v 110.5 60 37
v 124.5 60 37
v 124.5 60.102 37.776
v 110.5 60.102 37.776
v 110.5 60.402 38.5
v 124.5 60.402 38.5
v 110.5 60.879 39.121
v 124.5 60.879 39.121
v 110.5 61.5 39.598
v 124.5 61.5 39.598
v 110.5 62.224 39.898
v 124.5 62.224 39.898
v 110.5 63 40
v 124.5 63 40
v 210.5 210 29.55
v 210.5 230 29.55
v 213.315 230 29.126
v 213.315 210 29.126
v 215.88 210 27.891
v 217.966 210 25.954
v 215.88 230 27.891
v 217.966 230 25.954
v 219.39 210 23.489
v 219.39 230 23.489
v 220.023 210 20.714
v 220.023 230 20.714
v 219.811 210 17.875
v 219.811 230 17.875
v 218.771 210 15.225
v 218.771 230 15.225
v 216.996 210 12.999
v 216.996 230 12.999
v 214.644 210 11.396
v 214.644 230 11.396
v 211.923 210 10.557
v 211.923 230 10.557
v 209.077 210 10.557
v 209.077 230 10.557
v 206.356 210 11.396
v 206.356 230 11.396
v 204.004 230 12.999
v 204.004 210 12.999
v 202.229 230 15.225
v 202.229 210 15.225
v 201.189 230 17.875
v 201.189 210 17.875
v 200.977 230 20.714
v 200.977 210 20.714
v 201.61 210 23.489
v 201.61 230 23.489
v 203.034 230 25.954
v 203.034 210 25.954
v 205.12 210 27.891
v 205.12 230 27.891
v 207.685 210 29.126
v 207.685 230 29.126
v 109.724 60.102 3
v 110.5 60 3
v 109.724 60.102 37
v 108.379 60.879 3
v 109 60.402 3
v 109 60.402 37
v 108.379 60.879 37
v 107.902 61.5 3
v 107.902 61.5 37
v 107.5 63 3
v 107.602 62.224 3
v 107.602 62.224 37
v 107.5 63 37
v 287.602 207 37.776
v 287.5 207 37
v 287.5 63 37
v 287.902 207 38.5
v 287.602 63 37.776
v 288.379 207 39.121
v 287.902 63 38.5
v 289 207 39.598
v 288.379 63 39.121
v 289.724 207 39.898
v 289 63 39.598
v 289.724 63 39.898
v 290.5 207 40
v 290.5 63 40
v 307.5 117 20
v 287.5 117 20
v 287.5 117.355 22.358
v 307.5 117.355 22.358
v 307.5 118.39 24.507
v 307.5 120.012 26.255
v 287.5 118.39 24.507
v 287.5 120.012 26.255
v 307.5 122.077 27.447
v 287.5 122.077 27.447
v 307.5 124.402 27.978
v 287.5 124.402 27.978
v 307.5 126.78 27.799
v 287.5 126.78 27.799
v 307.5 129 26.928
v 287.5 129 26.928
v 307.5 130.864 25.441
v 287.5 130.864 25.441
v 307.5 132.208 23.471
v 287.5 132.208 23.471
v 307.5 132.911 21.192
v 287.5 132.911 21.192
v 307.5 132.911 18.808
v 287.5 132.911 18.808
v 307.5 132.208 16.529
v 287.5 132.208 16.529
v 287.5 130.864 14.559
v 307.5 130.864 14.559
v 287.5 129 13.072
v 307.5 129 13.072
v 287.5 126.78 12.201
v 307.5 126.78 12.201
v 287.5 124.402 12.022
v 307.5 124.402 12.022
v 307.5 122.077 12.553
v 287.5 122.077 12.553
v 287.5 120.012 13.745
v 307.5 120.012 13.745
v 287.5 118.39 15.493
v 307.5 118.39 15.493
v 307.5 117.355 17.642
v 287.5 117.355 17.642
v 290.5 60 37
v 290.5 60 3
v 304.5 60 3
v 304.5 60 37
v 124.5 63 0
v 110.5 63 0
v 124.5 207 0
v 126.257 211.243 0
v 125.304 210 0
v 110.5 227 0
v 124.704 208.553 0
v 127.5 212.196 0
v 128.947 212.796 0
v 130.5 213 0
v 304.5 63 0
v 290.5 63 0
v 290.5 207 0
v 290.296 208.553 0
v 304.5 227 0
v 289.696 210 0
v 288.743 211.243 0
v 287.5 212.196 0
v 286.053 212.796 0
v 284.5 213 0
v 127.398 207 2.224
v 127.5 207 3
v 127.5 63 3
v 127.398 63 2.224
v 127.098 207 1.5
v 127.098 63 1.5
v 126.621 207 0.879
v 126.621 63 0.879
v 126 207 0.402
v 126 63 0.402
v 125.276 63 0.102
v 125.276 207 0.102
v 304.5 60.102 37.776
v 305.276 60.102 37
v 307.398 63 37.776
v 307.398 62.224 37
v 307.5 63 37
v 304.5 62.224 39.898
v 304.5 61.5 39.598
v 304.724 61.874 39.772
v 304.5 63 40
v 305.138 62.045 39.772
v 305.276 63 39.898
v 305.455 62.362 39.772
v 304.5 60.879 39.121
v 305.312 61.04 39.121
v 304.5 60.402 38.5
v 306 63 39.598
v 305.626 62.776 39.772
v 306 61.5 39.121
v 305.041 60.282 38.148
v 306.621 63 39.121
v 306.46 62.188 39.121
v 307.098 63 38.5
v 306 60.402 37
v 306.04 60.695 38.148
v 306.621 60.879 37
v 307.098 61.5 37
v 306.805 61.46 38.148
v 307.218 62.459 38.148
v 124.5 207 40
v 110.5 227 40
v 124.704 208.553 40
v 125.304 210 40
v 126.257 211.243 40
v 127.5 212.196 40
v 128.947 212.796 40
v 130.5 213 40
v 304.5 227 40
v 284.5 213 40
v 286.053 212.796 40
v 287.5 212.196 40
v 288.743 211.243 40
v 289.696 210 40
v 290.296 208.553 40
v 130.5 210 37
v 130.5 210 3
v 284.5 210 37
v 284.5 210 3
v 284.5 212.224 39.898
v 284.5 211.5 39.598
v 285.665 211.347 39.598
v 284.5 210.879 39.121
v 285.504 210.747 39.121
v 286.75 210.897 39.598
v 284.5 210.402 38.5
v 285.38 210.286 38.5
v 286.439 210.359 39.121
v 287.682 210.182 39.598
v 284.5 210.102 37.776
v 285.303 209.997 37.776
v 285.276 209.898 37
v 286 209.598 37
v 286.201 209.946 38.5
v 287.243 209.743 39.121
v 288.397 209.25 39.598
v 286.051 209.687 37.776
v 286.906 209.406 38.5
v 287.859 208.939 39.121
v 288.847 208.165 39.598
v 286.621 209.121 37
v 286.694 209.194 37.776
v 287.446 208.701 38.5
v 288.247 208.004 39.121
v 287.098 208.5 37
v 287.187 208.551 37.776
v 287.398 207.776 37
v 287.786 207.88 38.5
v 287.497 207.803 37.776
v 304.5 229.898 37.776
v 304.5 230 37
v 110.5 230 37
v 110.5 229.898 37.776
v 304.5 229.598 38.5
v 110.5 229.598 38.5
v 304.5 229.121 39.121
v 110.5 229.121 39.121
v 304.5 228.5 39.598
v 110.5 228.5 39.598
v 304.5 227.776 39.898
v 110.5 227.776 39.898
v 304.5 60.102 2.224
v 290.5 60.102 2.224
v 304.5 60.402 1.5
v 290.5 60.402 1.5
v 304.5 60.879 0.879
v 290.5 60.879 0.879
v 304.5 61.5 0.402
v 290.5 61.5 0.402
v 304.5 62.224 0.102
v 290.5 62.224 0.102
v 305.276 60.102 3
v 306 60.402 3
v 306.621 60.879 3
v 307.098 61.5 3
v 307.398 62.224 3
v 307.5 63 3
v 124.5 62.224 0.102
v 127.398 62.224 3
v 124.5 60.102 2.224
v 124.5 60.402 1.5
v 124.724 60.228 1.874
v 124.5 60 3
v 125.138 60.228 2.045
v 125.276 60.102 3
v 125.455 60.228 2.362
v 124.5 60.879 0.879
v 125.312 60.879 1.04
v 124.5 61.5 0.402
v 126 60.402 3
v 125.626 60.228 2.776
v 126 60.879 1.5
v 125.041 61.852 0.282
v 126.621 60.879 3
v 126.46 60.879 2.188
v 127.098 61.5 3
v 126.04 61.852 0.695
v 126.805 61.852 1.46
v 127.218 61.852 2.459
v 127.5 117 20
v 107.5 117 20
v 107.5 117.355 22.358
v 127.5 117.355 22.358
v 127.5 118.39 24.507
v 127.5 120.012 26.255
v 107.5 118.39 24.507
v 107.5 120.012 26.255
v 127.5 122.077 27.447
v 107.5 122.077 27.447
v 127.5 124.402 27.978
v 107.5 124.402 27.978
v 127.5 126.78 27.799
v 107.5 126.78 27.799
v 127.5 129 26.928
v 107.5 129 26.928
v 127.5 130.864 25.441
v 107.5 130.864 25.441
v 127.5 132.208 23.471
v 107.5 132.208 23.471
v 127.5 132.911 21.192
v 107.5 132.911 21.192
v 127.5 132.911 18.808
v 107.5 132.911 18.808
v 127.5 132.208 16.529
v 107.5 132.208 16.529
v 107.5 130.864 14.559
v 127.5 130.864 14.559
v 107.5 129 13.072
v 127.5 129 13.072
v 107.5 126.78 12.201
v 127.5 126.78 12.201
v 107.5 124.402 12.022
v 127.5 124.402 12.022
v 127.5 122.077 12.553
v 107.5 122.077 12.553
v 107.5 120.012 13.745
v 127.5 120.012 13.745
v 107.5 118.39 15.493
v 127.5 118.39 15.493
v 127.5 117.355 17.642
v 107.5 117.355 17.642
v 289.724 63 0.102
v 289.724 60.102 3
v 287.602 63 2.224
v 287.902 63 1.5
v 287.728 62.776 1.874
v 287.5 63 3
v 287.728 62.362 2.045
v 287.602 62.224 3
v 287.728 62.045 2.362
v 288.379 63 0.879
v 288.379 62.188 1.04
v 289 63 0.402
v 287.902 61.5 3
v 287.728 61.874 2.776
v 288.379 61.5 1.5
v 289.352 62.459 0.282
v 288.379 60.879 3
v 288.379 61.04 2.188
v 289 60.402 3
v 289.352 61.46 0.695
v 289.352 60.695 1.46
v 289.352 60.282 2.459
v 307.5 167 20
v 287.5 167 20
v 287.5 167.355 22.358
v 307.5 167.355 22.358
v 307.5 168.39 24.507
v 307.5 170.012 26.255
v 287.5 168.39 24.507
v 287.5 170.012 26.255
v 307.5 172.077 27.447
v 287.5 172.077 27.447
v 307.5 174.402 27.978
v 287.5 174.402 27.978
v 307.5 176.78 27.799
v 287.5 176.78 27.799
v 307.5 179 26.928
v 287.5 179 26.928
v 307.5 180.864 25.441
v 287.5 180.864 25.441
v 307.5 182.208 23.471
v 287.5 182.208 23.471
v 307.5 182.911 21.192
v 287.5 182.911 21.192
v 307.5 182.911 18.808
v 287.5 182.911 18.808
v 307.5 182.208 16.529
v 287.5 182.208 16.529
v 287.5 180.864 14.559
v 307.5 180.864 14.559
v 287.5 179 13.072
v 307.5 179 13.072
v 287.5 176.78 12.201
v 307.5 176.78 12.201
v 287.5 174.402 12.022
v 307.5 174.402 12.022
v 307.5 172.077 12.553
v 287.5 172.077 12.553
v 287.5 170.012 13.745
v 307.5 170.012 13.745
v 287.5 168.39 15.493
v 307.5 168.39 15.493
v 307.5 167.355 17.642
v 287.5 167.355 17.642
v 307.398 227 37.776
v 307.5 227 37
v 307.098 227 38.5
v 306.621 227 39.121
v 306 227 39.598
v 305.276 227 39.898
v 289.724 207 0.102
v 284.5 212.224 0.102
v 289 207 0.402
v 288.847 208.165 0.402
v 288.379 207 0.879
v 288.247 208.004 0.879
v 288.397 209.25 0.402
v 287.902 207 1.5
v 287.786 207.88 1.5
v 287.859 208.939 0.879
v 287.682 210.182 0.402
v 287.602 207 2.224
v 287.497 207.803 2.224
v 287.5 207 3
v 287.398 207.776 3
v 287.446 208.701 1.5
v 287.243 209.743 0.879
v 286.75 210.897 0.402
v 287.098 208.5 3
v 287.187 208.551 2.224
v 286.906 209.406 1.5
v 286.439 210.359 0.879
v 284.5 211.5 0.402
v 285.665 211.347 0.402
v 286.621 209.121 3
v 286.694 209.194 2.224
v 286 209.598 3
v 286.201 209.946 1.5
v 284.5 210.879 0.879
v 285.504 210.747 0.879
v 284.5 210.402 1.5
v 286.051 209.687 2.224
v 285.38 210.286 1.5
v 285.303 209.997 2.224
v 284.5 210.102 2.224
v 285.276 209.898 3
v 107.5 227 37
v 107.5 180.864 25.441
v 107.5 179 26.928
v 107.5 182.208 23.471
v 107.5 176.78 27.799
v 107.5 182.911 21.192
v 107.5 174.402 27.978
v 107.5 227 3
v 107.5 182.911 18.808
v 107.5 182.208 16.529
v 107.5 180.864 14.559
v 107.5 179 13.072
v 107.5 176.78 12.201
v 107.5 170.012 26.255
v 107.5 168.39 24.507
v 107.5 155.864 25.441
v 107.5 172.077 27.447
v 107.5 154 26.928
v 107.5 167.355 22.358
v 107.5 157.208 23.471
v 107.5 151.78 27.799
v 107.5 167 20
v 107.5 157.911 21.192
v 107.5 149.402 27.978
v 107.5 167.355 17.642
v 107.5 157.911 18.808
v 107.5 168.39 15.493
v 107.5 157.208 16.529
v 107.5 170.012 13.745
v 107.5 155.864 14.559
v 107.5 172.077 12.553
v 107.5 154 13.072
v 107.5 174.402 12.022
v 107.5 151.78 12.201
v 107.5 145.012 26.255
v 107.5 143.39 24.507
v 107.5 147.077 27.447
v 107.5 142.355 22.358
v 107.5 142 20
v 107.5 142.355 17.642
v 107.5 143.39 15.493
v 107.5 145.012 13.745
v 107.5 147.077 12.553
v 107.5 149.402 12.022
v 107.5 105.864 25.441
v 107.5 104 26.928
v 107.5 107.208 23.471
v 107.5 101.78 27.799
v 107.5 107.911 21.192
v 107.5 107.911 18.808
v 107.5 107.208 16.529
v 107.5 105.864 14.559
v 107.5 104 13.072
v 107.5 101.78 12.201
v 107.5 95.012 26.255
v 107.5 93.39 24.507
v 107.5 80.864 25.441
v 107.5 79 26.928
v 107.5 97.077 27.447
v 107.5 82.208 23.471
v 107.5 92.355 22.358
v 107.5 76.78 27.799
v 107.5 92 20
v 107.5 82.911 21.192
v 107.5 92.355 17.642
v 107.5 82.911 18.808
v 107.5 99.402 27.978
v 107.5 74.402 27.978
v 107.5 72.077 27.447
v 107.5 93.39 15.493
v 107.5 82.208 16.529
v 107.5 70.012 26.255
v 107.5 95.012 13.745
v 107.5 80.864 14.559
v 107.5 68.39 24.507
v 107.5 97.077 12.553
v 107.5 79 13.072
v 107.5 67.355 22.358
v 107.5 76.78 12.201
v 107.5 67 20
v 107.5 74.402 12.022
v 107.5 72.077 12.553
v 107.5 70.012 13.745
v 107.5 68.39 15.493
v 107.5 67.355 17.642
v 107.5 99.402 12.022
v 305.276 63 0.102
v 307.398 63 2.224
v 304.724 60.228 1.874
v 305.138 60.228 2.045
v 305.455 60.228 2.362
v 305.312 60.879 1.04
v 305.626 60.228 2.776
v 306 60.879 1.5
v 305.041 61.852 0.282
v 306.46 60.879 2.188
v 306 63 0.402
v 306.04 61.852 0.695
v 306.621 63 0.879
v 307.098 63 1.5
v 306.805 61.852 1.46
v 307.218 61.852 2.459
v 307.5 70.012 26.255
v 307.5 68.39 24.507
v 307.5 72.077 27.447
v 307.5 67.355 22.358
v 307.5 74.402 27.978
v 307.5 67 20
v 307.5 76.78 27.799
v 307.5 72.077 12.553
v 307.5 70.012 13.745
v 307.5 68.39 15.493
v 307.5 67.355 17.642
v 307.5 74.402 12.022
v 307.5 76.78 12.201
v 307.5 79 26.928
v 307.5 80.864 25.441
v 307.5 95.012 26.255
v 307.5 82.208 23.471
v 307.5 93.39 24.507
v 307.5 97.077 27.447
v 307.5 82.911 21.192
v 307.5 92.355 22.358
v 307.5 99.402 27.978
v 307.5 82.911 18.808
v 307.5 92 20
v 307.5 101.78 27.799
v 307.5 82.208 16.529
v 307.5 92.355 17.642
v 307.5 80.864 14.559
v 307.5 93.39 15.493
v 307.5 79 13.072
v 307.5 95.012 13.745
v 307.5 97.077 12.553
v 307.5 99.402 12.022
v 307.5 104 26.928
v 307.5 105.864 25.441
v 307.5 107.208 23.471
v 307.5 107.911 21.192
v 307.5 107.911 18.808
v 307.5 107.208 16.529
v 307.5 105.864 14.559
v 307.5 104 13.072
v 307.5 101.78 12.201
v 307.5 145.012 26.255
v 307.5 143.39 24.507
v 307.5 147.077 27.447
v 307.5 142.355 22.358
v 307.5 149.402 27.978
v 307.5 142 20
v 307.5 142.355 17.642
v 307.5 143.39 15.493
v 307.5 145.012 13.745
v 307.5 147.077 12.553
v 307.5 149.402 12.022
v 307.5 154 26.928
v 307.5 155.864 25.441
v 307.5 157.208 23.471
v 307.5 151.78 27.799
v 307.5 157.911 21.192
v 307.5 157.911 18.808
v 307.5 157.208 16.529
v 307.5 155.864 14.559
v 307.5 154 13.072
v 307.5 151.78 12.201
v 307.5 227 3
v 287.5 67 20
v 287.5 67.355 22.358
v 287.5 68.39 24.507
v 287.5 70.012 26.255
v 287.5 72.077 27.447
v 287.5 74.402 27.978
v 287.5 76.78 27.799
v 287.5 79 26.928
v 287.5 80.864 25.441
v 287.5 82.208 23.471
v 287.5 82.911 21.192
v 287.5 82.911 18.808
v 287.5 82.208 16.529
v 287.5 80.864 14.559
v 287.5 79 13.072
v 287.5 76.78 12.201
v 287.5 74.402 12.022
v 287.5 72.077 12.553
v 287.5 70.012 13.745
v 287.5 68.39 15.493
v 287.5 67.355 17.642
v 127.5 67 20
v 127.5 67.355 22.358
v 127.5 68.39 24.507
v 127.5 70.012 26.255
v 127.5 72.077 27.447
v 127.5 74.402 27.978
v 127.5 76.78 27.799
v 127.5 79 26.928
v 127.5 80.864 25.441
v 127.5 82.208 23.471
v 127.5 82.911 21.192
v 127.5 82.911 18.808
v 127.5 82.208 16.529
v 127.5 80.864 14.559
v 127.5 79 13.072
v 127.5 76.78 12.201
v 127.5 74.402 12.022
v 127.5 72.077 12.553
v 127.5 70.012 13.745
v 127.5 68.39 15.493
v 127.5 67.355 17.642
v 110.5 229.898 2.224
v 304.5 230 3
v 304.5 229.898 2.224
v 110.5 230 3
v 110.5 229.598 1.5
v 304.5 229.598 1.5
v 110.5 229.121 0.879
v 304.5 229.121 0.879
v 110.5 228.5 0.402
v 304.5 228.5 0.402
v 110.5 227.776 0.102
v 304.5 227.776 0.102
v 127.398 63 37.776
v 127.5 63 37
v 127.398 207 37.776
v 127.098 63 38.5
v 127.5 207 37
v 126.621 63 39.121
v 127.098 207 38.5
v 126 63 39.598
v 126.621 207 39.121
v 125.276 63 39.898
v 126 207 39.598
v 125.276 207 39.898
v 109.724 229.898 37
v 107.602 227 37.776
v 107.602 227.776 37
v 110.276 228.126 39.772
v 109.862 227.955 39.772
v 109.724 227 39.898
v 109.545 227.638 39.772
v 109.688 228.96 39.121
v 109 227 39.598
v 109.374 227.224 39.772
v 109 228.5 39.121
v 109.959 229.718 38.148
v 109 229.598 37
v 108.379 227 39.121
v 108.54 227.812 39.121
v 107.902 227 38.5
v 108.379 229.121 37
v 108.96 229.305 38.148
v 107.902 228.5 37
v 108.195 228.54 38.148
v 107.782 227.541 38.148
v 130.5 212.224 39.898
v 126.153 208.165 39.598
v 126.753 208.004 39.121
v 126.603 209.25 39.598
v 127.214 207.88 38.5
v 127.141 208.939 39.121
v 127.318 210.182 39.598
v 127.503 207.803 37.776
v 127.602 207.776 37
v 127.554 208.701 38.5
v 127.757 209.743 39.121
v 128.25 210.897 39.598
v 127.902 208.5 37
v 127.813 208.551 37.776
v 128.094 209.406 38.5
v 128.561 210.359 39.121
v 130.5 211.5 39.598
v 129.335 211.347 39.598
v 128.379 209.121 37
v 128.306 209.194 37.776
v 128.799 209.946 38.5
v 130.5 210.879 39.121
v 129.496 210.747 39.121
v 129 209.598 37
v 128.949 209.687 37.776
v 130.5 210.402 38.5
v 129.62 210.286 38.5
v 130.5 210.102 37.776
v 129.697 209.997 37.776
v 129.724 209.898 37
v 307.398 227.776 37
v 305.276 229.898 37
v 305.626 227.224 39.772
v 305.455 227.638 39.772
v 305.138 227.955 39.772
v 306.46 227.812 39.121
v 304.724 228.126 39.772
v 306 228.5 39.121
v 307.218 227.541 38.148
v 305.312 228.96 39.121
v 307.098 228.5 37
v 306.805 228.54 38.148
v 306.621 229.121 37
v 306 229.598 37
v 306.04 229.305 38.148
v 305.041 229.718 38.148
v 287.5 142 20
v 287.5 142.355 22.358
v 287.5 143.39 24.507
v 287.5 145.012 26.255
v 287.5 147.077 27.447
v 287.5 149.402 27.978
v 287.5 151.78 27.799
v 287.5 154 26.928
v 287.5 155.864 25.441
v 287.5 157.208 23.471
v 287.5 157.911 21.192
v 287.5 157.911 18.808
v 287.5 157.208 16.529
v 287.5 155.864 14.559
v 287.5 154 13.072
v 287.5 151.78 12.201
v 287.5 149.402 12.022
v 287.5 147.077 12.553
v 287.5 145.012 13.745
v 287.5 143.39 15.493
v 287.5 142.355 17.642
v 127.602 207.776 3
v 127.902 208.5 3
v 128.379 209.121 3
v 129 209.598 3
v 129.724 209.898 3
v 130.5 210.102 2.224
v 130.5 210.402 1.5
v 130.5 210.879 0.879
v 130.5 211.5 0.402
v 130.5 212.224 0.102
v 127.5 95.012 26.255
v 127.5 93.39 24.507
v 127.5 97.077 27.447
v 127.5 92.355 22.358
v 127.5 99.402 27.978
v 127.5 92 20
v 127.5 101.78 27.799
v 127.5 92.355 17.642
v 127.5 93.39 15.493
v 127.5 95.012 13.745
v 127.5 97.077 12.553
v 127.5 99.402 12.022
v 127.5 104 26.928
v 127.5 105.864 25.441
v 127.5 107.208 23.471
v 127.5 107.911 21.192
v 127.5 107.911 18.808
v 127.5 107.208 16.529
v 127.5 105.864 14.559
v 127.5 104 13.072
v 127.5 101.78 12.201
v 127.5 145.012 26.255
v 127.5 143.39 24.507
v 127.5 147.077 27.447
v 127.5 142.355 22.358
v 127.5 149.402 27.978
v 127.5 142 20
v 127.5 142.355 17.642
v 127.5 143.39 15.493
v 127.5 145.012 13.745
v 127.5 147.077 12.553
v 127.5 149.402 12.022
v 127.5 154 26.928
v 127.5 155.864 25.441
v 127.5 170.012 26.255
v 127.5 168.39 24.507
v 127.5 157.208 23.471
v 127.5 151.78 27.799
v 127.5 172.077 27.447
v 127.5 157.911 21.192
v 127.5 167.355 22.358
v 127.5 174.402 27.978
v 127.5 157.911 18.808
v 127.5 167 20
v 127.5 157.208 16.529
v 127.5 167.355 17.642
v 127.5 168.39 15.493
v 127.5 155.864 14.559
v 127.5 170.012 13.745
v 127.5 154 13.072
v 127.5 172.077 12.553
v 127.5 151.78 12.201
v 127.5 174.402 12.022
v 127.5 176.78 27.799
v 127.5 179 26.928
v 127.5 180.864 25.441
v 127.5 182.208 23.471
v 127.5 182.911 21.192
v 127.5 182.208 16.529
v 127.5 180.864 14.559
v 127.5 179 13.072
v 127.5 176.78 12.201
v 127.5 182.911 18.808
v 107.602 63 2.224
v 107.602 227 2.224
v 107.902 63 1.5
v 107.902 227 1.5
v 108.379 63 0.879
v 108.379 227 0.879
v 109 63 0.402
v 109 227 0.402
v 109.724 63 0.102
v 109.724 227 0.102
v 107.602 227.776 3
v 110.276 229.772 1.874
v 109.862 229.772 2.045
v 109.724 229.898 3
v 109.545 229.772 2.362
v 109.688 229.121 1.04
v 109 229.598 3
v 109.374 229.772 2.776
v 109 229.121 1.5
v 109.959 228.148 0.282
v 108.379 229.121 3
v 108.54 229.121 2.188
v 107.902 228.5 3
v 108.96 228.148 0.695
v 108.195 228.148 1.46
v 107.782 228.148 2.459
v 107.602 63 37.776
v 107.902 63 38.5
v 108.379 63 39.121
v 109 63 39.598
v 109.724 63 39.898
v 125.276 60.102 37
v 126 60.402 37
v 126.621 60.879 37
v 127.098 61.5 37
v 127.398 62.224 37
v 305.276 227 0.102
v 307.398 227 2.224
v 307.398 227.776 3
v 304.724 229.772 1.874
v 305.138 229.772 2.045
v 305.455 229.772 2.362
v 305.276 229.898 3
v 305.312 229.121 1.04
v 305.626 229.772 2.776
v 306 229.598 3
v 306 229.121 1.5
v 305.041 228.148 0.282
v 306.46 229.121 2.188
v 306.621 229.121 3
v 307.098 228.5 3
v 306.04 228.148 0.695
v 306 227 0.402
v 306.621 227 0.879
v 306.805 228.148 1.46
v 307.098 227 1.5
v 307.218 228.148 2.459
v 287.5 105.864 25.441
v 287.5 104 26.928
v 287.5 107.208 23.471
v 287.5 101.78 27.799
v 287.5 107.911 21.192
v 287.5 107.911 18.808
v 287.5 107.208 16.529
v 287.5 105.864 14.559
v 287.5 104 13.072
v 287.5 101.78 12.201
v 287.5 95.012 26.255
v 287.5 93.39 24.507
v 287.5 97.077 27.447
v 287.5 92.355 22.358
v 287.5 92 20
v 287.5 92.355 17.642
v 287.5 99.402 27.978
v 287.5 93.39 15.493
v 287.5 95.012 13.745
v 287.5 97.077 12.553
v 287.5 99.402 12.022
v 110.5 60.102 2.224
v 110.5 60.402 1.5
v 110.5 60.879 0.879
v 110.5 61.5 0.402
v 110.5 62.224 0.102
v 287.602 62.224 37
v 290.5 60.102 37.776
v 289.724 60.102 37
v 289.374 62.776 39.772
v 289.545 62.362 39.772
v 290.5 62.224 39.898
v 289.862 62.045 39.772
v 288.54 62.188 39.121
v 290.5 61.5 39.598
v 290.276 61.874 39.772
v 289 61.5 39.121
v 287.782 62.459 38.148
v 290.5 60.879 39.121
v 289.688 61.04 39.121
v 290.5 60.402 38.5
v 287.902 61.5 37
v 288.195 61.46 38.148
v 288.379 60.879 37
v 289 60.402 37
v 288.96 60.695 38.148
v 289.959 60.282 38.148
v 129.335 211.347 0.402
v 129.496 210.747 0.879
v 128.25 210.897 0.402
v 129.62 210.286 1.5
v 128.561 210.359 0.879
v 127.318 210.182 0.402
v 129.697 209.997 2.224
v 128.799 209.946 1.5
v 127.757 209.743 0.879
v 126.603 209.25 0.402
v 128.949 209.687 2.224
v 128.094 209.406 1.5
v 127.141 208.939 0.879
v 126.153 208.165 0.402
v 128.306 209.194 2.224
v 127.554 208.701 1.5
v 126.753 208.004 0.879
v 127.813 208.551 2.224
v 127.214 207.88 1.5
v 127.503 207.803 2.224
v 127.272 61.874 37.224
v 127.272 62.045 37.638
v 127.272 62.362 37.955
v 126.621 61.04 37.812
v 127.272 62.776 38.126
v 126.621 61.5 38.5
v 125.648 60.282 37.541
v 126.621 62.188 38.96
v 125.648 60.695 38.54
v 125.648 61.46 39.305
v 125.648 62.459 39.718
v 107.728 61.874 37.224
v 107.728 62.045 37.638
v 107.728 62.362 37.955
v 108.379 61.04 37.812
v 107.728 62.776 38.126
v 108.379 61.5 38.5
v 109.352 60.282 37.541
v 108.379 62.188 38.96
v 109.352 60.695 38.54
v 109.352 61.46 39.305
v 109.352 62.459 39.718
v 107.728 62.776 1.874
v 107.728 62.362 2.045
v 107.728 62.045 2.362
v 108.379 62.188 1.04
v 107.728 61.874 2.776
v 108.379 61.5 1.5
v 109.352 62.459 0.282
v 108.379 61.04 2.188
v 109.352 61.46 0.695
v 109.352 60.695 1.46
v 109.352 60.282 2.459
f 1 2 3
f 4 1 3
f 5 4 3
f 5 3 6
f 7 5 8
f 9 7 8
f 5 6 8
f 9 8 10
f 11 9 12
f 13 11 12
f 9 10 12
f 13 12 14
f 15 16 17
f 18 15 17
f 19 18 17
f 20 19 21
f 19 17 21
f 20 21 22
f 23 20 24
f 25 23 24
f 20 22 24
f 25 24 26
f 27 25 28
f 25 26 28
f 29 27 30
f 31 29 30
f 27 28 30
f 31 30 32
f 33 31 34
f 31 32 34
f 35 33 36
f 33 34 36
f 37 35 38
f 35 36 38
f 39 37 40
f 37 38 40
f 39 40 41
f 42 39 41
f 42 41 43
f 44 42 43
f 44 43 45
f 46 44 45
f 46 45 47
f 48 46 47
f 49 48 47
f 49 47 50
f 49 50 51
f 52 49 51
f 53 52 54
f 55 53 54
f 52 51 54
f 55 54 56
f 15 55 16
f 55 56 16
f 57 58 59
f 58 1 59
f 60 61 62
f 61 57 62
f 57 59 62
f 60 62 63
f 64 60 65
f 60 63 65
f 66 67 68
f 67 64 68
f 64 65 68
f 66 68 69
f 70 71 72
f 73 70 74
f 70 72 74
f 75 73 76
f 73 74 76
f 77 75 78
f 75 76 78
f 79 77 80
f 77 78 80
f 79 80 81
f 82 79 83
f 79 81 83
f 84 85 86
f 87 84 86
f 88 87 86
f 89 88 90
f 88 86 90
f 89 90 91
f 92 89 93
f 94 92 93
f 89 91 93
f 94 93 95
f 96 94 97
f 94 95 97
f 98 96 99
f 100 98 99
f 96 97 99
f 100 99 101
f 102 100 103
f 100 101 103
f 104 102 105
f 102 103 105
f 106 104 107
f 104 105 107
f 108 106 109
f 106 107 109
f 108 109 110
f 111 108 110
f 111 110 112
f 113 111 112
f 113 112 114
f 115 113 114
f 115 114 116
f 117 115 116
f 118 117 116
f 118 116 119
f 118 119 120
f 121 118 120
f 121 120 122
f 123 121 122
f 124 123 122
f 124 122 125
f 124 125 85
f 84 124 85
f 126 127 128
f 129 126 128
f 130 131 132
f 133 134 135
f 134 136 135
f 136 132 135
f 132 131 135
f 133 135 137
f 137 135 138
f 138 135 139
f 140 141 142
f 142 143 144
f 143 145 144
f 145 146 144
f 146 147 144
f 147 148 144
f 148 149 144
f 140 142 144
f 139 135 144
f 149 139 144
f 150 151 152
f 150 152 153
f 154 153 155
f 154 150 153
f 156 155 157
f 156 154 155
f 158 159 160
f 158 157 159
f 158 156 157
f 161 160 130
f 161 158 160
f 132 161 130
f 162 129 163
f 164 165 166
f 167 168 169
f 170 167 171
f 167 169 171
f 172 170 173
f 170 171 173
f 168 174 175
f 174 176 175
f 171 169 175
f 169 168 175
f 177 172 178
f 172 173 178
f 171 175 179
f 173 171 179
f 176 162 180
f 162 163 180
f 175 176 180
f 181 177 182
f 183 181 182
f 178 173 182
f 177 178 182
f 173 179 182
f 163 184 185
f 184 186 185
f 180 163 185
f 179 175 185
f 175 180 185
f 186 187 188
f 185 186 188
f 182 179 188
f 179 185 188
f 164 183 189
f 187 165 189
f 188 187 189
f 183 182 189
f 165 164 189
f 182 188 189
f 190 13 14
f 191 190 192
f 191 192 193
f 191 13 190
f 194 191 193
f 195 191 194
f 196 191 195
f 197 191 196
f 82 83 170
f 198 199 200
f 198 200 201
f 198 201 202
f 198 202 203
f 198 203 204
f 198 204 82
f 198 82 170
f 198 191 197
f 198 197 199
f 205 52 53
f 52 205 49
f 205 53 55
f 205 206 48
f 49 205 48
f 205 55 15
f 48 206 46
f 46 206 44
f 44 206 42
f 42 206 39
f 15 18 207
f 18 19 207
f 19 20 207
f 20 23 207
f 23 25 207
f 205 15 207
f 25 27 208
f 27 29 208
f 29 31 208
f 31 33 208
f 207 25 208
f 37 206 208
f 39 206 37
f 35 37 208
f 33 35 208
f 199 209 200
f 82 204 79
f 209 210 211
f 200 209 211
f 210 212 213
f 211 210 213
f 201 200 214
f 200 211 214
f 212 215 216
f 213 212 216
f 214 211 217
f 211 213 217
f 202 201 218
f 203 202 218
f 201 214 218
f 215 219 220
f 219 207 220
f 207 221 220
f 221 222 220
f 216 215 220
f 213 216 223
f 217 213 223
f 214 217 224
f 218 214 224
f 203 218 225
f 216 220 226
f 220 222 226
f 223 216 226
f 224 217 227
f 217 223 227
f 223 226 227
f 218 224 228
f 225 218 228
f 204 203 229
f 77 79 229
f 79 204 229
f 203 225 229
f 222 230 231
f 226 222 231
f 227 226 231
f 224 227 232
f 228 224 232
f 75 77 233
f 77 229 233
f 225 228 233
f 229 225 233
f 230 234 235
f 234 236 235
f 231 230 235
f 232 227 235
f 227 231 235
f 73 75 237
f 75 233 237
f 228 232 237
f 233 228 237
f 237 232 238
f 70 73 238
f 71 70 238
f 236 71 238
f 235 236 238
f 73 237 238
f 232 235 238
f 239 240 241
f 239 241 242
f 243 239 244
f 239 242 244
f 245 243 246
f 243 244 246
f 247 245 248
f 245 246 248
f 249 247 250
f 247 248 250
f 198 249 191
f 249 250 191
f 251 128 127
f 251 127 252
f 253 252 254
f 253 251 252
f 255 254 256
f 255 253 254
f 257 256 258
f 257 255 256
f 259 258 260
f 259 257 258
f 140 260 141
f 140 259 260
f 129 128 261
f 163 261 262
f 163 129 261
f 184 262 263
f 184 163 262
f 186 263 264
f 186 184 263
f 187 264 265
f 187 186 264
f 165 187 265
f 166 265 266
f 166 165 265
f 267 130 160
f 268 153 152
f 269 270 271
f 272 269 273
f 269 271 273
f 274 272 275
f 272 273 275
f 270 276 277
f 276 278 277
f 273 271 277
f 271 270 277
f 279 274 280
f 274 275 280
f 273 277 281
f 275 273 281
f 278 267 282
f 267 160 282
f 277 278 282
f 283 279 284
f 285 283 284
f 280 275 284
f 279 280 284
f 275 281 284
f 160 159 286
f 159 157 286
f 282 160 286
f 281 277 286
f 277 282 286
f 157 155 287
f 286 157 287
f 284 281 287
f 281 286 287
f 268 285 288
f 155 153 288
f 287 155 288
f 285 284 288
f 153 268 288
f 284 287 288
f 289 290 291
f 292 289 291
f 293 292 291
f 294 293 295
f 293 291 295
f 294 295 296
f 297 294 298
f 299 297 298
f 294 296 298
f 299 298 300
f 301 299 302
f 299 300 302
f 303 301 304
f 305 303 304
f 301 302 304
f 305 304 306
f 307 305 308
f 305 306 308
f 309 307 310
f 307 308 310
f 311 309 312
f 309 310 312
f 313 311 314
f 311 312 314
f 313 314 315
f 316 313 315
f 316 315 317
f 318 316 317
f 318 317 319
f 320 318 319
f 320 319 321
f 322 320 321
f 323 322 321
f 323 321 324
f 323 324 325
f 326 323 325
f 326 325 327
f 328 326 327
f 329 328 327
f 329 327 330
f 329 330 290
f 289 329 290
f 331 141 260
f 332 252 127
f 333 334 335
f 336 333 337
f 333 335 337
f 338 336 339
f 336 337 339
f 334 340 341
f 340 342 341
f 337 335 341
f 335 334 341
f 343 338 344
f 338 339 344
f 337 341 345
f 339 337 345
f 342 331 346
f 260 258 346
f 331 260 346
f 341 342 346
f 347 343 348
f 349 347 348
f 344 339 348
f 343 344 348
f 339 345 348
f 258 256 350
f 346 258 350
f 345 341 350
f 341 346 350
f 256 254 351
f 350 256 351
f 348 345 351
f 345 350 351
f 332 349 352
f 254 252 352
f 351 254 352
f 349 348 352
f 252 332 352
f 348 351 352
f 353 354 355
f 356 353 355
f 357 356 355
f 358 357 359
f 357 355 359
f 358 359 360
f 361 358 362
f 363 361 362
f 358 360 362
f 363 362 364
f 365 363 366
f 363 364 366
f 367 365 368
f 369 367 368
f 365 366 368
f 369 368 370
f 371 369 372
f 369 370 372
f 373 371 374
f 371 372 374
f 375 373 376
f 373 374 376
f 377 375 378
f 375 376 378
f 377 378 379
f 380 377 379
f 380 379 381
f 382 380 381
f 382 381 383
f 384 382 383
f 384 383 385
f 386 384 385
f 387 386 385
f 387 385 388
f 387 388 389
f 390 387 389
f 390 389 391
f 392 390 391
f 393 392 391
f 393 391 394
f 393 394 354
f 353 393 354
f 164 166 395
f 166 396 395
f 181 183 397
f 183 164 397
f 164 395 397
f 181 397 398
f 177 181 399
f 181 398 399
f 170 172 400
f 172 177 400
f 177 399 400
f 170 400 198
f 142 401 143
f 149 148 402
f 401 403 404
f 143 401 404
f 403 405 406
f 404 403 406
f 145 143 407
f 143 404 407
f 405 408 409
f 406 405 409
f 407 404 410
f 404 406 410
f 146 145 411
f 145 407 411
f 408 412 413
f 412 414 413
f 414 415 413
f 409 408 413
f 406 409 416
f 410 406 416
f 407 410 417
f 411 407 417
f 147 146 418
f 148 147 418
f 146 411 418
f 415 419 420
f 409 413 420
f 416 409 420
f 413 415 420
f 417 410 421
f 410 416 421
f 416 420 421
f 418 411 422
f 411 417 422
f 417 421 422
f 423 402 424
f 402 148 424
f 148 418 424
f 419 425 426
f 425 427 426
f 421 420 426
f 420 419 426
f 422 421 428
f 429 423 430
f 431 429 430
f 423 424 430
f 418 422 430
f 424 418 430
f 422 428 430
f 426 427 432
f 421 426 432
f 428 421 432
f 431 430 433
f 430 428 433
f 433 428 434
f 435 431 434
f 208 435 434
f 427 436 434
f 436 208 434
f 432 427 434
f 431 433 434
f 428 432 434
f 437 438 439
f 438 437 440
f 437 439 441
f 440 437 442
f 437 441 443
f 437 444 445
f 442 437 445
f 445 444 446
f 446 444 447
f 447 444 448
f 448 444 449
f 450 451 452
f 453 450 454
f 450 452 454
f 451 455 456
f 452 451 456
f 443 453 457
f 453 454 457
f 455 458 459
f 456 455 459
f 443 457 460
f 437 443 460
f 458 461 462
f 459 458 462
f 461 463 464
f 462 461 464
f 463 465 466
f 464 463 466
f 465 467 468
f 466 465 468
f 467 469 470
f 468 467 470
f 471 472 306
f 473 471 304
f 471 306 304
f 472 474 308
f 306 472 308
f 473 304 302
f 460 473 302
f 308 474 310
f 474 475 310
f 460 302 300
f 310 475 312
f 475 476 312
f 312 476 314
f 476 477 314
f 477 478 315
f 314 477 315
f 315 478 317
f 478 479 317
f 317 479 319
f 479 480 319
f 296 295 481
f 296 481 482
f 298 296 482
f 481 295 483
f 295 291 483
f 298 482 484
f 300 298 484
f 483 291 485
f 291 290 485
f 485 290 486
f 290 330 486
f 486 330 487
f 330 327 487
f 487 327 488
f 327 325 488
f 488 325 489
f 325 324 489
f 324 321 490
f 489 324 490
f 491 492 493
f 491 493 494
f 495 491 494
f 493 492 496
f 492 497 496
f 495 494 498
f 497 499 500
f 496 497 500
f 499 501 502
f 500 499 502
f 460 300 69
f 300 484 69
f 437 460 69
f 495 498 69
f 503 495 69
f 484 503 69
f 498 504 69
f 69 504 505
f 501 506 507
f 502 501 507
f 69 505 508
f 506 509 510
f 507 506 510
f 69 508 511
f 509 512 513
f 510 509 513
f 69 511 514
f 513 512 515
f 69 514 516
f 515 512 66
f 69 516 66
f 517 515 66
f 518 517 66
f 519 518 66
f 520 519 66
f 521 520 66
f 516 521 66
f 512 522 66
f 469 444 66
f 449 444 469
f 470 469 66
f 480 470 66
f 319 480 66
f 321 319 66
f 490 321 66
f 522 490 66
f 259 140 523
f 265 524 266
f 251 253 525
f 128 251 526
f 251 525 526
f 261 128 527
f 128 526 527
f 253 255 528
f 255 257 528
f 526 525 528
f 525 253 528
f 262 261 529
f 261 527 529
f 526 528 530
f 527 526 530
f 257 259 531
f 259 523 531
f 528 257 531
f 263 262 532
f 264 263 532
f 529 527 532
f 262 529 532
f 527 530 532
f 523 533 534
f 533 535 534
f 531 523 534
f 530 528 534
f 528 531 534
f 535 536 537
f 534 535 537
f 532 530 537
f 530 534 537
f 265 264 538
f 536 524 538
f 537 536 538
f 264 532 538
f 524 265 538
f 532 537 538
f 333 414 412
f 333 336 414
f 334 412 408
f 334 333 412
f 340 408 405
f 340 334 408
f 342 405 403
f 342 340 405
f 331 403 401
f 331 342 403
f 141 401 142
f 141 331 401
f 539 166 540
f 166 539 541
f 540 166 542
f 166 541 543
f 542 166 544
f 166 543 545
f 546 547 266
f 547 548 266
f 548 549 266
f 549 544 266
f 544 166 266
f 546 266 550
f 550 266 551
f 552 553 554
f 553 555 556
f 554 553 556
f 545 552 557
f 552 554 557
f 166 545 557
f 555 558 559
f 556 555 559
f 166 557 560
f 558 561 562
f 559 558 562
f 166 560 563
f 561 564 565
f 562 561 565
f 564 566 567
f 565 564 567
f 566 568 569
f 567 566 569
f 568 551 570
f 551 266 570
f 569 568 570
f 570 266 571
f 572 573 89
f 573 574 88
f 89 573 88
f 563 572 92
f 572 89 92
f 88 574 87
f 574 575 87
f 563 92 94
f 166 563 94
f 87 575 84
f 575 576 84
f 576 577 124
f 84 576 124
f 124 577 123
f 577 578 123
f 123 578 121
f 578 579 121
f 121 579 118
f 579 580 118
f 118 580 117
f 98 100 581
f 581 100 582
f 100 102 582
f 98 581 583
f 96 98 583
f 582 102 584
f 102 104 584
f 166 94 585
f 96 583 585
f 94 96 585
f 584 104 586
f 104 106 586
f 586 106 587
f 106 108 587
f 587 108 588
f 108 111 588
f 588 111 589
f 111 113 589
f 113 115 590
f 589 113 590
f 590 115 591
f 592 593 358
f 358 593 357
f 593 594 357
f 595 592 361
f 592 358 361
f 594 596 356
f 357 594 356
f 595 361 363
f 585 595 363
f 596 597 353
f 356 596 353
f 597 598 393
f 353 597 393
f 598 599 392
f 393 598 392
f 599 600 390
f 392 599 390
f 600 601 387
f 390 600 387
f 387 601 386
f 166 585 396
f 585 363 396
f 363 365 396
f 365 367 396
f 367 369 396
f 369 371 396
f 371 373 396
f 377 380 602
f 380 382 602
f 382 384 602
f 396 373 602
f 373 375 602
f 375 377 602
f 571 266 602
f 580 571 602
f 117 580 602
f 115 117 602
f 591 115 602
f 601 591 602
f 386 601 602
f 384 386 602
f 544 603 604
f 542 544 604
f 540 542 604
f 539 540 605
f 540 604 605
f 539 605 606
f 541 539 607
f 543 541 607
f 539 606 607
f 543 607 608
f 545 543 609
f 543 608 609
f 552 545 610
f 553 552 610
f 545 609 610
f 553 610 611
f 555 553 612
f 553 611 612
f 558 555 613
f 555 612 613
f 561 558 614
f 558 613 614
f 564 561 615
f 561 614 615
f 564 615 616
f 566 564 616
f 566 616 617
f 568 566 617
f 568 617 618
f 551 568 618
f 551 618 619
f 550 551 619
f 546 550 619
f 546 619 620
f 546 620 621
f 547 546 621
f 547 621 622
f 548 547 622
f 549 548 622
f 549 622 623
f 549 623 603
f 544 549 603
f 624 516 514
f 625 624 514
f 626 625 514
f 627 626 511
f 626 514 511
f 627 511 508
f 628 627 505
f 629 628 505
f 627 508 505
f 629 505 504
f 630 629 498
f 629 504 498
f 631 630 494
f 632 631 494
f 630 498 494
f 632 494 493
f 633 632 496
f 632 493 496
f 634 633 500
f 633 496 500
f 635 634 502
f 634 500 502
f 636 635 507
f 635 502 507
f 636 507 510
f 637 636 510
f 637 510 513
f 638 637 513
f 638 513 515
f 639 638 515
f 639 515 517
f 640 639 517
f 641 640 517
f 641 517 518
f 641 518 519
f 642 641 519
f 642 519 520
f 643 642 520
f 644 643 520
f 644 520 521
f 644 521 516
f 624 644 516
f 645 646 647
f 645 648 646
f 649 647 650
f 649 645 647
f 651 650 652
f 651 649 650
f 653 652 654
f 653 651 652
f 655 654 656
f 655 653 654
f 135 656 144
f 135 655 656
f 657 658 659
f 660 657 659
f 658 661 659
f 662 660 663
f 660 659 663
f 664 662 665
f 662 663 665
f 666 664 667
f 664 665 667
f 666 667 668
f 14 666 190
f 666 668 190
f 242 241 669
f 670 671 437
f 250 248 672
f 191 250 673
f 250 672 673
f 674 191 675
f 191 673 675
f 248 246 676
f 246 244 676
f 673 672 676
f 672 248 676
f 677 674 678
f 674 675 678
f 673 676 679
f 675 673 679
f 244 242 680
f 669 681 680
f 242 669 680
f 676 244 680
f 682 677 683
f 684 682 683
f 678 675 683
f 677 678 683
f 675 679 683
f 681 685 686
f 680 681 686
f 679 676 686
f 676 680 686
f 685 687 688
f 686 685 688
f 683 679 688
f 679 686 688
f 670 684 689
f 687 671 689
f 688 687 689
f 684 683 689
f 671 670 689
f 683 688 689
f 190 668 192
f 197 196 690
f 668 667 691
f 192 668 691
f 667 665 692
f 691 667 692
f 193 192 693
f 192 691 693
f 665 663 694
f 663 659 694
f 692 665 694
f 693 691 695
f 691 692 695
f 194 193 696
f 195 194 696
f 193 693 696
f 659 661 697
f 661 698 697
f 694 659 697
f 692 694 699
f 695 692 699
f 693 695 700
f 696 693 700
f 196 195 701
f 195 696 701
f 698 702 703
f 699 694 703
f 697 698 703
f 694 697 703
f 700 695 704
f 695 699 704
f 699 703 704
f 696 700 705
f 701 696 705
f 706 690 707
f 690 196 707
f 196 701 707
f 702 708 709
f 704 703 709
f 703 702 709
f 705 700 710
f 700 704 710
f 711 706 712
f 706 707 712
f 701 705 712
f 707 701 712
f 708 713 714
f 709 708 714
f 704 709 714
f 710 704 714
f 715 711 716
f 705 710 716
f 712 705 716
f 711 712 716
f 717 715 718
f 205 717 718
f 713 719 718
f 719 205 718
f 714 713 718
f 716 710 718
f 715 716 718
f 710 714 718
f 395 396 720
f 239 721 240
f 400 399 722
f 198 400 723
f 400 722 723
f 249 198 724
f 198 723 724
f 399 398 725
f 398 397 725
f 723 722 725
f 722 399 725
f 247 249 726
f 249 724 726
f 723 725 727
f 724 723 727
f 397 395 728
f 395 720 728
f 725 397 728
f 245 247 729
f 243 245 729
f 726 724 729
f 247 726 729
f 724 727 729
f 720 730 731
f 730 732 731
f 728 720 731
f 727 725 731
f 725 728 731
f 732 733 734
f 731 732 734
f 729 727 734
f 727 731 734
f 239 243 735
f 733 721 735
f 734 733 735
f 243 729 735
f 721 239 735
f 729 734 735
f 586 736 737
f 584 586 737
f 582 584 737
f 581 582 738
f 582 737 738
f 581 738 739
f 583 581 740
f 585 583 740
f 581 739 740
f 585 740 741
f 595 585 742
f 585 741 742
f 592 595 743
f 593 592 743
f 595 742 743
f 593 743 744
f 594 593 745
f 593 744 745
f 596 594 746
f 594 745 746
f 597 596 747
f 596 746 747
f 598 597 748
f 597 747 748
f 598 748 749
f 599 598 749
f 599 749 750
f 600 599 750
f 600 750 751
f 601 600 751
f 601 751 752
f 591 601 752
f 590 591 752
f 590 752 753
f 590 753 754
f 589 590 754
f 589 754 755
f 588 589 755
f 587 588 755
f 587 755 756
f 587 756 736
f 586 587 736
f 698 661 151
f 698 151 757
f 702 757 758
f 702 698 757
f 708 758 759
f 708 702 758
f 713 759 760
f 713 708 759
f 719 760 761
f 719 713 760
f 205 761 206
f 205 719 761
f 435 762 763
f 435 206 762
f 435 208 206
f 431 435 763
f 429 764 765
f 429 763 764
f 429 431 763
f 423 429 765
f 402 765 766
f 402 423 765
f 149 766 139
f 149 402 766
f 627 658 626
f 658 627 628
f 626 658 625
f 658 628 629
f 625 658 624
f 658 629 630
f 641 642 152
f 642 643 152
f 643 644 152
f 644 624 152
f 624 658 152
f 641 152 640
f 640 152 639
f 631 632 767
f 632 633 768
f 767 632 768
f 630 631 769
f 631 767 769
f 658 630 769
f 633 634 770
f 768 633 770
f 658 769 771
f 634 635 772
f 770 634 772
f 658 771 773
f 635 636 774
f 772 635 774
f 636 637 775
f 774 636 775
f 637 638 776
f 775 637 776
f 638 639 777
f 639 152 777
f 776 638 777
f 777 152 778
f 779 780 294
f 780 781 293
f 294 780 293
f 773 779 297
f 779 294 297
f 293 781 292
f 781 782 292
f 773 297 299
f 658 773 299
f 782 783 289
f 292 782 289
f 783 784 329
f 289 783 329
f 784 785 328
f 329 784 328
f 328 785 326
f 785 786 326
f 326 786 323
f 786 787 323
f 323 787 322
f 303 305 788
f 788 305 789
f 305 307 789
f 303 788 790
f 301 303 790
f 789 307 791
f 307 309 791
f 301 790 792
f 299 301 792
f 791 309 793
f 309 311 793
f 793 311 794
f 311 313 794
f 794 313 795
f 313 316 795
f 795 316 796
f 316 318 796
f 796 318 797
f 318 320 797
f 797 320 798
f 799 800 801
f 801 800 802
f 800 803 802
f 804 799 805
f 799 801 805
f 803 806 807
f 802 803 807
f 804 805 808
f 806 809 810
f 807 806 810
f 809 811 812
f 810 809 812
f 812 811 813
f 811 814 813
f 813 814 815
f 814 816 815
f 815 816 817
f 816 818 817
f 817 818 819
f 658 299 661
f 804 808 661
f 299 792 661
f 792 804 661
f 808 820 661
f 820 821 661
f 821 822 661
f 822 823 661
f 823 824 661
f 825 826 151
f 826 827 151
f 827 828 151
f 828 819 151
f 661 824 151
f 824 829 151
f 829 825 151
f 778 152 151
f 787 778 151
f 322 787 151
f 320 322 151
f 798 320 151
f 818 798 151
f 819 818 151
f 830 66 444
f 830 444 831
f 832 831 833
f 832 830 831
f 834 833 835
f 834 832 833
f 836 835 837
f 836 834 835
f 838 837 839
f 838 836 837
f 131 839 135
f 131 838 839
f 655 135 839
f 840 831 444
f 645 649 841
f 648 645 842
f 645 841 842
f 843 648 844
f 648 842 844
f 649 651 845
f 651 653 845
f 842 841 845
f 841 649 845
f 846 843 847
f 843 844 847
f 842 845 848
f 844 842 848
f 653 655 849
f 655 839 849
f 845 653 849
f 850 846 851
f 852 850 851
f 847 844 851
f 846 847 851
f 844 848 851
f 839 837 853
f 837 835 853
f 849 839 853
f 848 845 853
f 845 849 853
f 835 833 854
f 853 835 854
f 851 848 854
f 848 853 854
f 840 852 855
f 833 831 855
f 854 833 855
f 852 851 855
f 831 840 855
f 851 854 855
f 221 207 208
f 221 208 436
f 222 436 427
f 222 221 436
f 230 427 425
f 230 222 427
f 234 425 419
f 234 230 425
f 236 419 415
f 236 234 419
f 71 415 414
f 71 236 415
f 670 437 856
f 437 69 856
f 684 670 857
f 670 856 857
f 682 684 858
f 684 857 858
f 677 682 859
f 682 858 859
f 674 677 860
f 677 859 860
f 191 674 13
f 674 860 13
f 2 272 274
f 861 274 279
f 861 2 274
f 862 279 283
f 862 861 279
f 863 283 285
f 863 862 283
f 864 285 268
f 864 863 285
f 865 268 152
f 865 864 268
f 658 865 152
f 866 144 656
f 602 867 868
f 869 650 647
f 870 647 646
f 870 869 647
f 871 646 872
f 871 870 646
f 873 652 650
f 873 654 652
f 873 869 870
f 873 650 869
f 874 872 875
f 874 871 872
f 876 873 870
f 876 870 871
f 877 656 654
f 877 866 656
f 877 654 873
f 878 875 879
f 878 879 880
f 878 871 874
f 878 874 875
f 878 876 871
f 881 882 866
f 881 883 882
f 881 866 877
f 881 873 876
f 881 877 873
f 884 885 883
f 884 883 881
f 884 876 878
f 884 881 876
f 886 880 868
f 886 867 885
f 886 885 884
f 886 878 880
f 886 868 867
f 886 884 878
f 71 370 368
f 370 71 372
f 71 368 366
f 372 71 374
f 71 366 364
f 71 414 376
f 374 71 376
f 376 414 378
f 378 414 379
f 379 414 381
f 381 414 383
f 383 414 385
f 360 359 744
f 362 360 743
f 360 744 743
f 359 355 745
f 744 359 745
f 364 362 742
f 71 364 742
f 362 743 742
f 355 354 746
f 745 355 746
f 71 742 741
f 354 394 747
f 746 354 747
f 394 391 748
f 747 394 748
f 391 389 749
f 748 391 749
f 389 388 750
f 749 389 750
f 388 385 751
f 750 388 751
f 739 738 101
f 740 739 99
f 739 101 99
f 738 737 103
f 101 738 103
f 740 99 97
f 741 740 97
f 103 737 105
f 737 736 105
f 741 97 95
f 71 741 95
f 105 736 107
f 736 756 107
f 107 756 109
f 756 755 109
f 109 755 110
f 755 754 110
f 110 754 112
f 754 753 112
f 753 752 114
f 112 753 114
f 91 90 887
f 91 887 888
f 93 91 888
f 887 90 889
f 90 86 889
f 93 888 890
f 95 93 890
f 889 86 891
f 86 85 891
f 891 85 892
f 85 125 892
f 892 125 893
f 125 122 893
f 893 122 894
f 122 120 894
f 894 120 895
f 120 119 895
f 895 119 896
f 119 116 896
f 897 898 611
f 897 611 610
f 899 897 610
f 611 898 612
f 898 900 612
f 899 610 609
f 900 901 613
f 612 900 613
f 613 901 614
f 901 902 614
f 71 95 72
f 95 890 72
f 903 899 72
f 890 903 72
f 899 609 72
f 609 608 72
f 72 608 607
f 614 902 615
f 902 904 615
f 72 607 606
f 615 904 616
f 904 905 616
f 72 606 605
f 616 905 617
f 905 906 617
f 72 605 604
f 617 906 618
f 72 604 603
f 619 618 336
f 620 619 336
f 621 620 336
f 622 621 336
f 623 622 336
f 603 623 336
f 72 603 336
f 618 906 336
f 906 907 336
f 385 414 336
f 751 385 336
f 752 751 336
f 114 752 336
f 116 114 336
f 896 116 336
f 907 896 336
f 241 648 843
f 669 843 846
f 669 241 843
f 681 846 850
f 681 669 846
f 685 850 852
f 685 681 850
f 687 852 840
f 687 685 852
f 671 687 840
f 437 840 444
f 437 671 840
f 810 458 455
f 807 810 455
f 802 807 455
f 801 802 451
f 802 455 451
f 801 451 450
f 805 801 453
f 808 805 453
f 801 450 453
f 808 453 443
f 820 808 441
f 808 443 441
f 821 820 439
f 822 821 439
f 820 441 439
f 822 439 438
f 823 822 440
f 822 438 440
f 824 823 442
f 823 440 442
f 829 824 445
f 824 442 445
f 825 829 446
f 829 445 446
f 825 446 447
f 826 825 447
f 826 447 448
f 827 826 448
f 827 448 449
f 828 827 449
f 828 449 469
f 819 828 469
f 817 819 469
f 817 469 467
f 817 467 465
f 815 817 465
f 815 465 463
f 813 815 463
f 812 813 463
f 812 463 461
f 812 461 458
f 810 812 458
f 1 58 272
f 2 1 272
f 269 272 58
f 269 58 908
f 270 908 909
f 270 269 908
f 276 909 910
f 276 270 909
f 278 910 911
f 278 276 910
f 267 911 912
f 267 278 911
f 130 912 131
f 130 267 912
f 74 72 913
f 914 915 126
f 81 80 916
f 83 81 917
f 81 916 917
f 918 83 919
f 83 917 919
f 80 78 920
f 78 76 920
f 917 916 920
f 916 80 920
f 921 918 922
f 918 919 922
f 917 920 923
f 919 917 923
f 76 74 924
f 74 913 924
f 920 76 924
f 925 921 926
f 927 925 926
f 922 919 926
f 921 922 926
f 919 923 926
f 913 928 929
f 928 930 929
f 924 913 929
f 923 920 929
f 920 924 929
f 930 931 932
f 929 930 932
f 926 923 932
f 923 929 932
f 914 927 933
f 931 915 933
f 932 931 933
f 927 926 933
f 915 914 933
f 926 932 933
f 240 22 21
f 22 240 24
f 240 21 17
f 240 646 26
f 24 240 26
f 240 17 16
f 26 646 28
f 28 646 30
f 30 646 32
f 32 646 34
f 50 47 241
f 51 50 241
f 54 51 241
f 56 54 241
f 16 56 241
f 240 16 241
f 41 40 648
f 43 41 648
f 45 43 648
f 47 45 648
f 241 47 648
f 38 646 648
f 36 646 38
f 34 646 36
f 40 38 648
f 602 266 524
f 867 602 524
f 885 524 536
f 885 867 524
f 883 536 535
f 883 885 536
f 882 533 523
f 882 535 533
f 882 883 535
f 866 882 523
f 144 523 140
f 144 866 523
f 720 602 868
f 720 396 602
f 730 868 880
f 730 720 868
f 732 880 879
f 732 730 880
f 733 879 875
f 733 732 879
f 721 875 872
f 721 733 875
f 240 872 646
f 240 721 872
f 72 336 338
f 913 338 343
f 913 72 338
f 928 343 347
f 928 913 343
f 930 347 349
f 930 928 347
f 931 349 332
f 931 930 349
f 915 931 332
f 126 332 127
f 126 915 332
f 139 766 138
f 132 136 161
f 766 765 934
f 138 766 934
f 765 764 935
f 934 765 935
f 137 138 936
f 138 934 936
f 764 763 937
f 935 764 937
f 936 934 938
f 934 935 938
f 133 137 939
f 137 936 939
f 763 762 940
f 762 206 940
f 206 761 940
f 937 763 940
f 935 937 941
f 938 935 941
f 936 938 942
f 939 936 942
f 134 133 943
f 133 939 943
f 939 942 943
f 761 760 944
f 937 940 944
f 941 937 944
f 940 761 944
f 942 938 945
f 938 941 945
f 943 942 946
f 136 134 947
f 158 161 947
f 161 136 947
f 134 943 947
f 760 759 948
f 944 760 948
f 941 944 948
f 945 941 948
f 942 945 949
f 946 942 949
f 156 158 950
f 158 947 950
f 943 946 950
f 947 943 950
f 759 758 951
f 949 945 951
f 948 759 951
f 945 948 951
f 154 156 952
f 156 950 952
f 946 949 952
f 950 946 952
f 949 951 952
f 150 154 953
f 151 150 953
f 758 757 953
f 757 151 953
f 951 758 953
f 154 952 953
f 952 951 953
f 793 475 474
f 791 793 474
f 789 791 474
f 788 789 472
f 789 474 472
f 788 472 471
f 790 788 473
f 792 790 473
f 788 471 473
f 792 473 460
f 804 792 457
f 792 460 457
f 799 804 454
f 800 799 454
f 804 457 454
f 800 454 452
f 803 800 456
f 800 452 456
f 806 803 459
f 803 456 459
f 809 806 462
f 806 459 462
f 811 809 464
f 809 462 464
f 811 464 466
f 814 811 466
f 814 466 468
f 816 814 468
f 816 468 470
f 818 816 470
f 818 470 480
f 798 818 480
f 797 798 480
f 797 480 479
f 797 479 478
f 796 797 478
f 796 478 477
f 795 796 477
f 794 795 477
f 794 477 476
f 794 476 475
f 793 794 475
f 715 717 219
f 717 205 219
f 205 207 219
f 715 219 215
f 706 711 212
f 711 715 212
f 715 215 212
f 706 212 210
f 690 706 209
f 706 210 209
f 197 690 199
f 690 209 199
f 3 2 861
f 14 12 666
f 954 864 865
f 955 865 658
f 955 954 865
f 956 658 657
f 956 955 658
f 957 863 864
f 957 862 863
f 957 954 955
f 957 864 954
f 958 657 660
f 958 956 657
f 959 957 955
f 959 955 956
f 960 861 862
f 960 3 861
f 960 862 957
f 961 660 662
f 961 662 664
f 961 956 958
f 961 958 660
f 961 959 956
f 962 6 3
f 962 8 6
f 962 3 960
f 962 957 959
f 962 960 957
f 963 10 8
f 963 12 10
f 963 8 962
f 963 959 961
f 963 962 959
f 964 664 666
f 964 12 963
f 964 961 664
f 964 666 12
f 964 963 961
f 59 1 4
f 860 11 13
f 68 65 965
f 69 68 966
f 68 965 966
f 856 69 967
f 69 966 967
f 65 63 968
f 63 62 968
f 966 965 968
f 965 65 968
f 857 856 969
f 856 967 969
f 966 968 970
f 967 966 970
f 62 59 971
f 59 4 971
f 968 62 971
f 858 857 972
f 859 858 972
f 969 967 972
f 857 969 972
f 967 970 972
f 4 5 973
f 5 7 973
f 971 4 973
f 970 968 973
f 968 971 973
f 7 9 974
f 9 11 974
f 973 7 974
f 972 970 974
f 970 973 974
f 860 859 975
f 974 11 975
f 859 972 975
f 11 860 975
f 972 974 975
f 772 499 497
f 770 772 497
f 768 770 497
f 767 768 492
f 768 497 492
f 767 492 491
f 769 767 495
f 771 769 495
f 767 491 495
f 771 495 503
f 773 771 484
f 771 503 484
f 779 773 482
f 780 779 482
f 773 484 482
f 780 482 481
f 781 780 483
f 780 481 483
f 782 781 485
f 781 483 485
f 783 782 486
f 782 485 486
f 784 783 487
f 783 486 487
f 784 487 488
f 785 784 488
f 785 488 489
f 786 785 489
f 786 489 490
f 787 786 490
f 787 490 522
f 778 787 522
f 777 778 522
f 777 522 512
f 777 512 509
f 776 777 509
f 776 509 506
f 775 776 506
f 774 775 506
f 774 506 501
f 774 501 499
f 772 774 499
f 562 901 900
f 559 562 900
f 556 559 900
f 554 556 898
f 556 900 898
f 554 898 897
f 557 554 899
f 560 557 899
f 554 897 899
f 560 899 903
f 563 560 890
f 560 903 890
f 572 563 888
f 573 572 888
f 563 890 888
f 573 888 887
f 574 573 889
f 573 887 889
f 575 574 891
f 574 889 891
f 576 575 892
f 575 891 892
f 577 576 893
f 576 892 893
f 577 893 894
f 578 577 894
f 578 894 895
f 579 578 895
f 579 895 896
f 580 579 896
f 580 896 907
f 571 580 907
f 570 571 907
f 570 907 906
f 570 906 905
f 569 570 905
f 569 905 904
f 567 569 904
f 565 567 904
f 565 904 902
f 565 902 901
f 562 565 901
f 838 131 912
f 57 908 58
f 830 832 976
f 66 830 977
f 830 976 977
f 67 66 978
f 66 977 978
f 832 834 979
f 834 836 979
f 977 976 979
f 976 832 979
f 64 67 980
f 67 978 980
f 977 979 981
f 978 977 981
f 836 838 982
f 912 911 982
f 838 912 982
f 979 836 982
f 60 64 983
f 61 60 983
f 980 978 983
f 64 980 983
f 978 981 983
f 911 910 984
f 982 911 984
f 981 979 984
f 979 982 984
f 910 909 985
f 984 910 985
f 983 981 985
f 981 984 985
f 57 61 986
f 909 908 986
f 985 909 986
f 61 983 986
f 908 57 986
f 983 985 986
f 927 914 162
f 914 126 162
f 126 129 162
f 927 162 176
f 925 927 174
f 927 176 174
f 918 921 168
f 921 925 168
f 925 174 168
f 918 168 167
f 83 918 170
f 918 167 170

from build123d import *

# Parameters (mm, degrees)
BOSS_EXTRUDE1_DEPTH = 40
FILLET1_R           = 3
SKETCH2_R           = 9.55
CUT_EXTRUDE1_DEPTH  = 20
SKETCH5_R           = 8
CUT_EXTRUDE2_DEPTH  = 200
LPATTERN2_COUNT     = 5
LPATTERN2_PITCH     = 25


with BuildPart() as part:
    # Sketch1 → Boss-Extrude1 (new body)
    with BuildSketch(Plane.XY):
        Polygon((107.5, 210), (107.5, 60), (127.5, 60), (127.5, 210), (287.5, 210), (287.5, 60), (307.5, 60), (307.5, 210), (307.5, 230), (107.5, 230), align=None)
    extrude(amount=BOSS_EXTRUDE1_DEPTH)

    # Fillet1
    fillet1_edges = [part.edges().sort_by_distance(p)[0] for p in [
        (307.5, 145, 0),
        (297.5, 60, 0),
        (287.5, 135, 0),
        (207.5, 210, 0),
        (127.5, 135, 0),
        (117.5, 60, 0),
        (107.5, 145, 0),
        (207.5, 230, 0),
        (117.5, 60, 40),
        (307.5, 230, 20),
        (307.5, 60, 20),
        (287.5, 60, 20),
        (287.5, 210, 20),
        (127.5, 210, 20),
        (127.5, 60, 20),
        (107.5, 60, 20),
        (107.5, 230, 20),
        (127.5, 135, 40),
        (207.5, 210, 40),
        (287.5, 135, 40),
        (297.5, 60, 40),
        (307.5, 145, 40),
        (207.5, 230, 40),
        (107.5, 145, 40),
    ]]
    fillet(fillet1_edges, radius=FILLET1_R)

    # Sketch2 → Cut-Extrude1 (cut)
    with BuildSketch(Plane(origin=(0, 230, 0), x_dir=(1, 0, 0), z_dir=(0, 1, 0))):
        with Locations(Location((210.5, -20, 0), (0, 0, 270))):
            Circle(SKETCH2_R)
    extrude(amount=-CUT_EXTRUDE1_DEPTH, mode=Mode.SUBTRACT)

    # Sketch5 → Cut-Extrude2 (cut)
    with BuildSketch(Plane.ZY.offset(-107.5)):
        with Locations(Location((20, 75, 0), (0, 0, 270))):
            Circle(SKETCH5_R)
    cut_extrude2 = extrude(amount=-CUT_EXTRUDE2_DEPTH, mode=Mode.SUBTRACT)

    # LPattern2: Cut-Extrude2 ×5
    with Locations(*[(0, i * LPATTERN2_PITCH, 0) for i in range(1, LPATTERN2_COUNT)]):
        add(cut_extrude2, mode=Mode.SUBTRACT)


solid = part.part
